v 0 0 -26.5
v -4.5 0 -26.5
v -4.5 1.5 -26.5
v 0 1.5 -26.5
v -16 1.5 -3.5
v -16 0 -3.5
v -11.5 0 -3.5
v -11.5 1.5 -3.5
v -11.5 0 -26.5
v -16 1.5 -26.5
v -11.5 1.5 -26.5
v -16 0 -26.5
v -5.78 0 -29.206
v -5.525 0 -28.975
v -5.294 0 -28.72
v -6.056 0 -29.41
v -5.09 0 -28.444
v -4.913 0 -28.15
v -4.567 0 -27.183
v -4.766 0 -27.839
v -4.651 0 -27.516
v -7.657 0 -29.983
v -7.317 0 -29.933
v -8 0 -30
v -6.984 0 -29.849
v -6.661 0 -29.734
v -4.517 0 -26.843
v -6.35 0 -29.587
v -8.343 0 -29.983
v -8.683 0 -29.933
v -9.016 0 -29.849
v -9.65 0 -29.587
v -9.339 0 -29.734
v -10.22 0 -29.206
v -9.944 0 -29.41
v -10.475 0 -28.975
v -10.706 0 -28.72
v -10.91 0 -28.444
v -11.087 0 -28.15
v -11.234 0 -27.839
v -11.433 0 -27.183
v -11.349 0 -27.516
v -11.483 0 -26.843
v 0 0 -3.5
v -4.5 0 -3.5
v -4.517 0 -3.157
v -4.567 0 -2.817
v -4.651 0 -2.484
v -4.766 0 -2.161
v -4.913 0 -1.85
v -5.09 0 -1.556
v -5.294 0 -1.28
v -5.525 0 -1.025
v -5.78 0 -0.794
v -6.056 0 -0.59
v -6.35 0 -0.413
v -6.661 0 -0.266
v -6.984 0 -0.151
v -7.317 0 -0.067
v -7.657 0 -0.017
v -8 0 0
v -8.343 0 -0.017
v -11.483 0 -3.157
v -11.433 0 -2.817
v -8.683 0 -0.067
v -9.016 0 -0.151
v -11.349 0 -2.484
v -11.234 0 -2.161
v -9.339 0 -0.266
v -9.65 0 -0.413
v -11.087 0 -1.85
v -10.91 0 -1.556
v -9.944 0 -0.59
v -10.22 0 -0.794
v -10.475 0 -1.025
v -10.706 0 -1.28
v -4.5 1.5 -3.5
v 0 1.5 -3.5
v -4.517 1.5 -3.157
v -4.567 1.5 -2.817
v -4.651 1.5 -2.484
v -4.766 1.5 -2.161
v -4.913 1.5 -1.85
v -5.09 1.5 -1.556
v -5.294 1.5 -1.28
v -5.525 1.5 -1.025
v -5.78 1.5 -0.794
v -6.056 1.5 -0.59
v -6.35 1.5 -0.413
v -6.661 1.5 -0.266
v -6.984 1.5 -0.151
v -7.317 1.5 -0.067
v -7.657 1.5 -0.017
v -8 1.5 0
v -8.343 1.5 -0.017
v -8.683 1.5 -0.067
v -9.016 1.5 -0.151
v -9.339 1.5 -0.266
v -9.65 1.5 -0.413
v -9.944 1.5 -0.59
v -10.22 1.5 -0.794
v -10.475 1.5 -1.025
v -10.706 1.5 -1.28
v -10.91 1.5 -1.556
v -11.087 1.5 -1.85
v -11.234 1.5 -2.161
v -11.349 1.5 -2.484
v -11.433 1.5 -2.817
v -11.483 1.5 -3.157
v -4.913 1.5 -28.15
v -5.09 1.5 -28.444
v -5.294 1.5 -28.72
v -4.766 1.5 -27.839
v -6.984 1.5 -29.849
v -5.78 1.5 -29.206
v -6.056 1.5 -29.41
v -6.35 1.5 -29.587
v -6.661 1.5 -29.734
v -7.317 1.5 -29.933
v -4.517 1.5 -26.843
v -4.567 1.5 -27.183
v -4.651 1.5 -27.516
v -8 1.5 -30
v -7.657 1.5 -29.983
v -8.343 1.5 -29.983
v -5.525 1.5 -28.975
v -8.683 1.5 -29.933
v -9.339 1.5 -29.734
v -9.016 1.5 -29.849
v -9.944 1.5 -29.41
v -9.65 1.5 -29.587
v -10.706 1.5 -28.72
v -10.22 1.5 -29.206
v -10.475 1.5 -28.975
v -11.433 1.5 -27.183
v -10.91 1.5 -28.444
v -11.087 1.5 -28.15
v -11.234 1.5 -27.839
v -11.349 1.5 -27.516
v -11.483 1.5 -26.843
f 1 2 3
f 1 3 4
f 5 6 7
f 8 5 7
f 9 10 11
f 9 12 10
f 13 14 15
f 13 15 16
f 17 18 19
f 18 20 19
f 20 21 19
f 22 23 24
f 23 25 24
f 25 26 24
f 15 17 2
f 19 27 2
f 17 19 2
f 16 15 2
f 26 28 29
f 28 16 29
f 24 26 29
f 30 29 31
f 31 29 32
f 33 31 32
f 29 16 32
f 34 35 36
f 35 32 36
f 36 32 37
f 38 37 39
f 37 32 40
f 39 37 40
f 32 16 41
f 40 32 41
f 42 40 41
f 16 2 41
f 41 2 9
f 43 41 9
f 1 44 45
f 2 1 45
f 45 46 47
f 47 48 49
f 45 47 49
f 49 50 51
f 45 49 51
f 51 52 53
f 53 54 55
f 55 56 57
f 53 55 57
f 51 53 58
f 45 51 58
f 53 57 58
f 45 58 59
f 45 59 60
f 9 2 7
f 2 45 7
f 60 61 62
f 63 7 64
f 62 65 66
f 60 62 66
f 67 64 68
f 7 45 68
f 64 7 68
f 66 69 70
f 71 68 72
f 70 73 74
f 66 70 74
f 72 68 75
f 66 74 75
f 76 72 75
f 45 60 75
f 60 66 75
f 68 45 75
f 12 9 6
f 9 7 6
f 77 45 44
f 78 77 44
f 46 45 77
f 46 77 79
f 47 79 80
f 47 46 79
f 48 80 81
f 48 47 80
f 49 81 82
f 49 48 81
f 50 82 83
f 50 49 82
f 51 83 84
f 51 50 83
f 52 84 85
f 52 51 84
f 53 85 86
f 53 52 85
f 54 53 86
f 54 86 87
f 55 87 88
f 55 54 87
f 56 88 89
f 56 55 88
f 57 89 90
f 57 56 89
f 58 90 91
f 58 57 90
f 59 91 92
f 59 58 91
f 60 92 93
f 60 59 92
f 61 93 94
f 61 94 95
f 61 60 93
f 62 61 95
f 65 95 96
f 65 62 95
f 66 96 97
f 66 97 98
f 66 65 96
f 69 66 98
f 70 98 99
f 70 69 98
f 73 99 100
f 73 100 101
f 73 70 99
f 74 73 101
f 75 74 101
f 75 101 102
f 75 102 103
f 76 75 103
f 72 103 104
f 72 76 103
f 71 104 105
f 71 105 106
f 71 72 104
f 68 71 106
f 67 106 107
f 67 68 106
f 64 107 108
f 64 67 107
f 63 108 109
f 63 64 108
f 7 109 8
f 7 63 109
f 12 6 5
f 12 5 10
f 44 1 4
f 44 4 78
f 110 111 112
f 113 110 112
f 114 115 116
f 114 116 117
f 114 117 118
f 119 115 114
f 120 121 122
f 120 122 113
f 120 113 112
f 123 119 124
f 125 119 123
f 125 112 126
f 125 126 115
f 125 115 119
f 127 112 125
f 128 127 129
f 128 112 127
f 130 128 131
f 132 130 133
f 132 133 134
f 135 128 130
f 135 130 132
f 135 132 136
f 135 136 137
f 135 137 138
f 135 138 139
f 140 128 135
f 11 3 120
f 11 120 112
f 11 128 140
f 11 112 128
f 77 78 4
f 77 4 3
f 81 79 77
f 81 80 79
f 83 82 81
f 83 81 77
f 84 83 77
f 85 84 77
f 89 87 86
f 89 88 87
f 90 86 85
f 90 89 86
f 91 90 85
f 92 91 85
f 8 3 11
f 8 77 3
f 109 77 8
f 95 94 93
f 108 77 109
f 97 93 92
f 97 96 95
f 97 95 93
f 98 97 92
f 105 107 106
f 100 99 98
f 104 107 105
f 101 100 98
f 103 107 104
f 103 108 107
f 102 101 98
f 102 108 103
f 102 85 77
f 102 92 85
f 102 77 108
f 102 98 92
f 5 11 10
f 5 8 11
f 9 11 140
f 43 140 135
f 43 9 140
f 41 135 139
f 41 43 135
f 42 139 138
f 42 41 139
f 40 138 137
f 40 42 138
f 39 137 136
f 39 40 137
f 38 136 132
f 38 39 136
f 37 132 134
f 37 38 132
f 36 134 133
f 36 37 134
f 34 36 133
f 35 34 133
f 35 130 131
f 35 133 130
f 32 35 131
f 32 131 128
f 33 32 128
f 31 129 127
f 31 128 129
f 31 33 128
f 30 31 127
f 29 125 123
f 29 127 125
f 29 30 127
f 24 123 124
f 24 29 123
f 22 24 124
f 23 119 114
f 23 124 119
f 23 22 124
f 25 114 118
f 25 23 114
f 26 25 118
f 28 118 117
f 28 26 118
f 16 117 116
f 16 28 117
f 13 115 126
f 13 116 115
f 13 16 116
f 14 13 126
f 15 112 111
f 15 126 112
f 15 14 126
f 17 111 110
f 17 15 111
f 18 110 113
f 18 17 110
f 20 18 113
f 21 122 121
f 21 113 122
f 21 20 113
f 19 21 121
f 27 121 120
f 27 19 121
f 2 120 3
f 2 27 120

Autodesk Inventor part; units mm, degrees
ref_plane "YZ Plane" through (0, 0, 0) normal (1, 0, 0) x (0, 1, 0)
ref_plane "XZ Plane" through (0, 0, 0) normal (0, 1, 0) x (-1, 0, 0)
ref_plane "XY Plane" through (0, 0, 0) normal (0, 0, 1) x (1, 0, 0)
sketch "スケッチ1" plane through (0, 0, 0) normal (0, 1, 0) x (-1, 0, 0)
  line L0 (0, 0) -> (16, 0)
  line L1 (16, 0) -> (16, -30)
  line L2 (16, -30) -> (0, -30)
  line L3 (0, -30) -> (0, 0)
  circle A0 centre (8, -3.5) radius 3.5
  circle A1 centre (8, -26.5) radius 3.5
  line L4 (16, -3.5) -> (0, -3.5)
  line L5 (16, -26.5) -> (-0.2656, -26.5)
  point P0 (8, 0)
  point P1 (11.5, -3.5)
  point P2 (4.5, -3.5)
  point P3 (0, -26.5)
  point P4 (4.5, -26.5)
  point P5 (11.5, -26.5)
  dimension "d0" = 16
  dimension "d1" = 30
  dimension "d2" = 7
extrude "押し出し1" add sketch "スケッチ1" along normal blind 1.5 contours A0 L4 | L4 A0 L1 L5 A1 L3 | A0 L4 | L5 A1 | A1 L5
properties part number "external_input"
